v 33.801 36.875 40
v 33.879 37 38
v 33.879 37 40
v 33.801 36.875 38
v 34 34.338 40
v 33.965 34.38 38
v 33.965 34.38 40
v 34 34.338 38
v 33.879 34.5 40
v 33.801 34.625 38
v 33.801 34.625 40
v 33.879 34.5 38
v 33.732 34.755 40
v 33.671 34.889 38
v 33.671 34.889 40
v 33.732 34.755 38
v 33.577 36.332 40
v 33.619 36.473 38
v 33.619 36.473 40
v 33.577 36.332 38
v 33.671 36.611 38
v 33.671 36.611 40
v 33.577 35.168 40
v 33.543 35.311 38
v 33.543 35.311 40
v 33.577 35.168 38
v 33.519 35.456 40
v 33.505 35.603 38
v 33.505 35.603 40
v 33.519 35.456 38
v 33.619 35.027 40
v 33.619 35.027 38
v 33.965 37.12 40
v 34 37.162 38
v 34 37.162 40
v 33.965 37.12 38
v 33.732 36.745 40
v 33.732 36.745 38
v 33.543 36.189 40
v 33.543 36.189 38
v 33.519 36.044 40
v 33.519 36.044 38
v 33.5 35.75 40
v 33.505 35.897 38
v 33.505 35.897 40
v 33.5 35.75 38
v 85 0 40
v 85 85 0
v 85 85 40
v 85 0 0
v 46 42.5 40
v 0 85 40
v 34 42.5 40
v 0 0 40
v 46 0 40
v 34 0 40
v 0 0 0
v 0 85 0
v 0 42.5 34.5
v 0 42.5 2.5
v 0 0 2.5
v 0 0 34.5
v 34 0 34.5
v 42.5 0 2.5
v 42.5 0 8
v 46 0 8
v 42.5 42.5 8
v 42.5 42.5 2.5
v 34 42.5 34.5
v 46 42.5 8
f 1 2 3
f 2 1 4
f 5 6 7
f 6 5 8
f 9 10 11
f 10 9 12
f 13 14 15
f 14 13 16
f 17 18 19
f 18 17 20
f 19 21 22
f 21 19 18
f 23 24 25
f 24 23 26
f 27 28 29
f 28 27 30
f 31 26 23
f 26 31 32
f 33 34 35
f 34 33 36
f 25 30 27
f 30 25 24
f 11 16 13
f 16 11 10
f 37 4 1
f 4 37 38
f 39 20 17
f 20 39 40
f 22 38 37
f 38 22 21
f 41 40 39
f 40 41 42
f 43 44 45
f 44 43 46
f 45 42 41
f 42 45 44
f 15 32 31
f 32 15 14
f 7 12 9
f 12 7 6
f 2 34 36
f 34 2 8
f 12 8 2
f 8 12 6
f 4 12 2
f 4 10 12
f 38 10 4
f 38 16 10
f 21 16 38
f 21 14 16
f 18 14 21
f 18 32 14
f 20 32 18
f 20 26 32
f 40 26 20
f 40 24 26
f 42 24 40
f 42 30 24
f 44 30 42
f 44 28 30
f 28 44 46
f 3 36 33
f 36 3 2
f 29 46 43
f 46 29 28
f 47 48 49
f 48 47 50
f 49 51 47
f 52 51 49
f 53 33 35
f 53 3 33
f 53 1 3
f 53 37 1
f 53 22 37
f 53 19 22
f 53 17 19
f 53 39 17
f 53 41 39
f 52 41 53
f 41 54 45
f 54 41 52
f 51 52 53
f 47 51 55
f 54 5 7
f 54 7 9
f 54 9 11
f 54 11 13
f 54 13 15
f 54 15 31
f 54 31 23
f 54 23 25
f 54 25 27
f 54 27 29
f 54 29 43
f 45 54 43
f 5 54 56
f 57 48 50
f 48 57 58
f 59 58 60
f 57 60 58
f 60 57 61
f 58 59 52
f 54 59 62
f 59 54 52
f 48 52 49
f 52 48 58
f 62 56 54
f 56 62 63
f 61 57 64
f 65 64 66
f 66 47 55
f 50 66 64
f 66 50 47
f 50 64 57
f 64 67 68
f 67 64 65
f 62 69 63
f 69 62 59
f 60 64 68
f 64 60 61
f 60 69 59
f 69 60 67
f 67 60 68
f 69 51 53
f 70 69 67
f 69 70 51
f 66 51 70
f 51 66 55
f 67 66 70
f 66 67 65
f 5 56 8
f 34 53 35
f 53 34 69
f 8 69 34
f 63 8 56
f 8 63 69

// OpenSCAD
// Magnetic stirrer housing for 80 mm PC case fan
// Print orientation: closed top plate on bed, open bottom facing up

// ---------- Parameters ----------
fan_o     = 80;    // fan outer diameter
plate_t   = 2;     // top plate thickness
wall_t    = 2.5;   // wall thickness
height    = 40;    // outer height (z = 0 to 40)
screw_d   = 4.5;   // M4 screw hole diameter
screw_p   = 71.5;  // screw hole square pitch
notch_w   = 12;    // cable notch width
notch_h   = 8;     // cable notch depth from open edge
eps       = 0.5;   // cutter overshoot

$fn = 96;

// ---------- Model ----------
difference() {
    // Outer box
    cube([fan_o + 2 * wall_t, fan_o + 2 * wall_t, height]);

    // Open bottom (from wall_t down to height - notch_h)
    translate([-fan_o / 2 - wall_t, -fan_o / 2 - wall_t, wall_t])
        cube([fan_o + 2 * wall_t, fan_o + 2 * wall_t, height - notch_h]);

    // Screw holes in top plate
    for (i = [-1, 1])
        for (j = [-1, 1])
            translate([i * screw_p / 2, j * screw_p / 2, height - plate_t])
                cylinder(d = screw_d, h = plate_t + eps);

    // Cable notch in +X wall
    translate([fan_o / 2 - notch_w / 2, -fan_o / 2 - wall_t, notch_h])
        cube([notch_w, fan_o + 2 * wall_t, height - notch_h]);
}
